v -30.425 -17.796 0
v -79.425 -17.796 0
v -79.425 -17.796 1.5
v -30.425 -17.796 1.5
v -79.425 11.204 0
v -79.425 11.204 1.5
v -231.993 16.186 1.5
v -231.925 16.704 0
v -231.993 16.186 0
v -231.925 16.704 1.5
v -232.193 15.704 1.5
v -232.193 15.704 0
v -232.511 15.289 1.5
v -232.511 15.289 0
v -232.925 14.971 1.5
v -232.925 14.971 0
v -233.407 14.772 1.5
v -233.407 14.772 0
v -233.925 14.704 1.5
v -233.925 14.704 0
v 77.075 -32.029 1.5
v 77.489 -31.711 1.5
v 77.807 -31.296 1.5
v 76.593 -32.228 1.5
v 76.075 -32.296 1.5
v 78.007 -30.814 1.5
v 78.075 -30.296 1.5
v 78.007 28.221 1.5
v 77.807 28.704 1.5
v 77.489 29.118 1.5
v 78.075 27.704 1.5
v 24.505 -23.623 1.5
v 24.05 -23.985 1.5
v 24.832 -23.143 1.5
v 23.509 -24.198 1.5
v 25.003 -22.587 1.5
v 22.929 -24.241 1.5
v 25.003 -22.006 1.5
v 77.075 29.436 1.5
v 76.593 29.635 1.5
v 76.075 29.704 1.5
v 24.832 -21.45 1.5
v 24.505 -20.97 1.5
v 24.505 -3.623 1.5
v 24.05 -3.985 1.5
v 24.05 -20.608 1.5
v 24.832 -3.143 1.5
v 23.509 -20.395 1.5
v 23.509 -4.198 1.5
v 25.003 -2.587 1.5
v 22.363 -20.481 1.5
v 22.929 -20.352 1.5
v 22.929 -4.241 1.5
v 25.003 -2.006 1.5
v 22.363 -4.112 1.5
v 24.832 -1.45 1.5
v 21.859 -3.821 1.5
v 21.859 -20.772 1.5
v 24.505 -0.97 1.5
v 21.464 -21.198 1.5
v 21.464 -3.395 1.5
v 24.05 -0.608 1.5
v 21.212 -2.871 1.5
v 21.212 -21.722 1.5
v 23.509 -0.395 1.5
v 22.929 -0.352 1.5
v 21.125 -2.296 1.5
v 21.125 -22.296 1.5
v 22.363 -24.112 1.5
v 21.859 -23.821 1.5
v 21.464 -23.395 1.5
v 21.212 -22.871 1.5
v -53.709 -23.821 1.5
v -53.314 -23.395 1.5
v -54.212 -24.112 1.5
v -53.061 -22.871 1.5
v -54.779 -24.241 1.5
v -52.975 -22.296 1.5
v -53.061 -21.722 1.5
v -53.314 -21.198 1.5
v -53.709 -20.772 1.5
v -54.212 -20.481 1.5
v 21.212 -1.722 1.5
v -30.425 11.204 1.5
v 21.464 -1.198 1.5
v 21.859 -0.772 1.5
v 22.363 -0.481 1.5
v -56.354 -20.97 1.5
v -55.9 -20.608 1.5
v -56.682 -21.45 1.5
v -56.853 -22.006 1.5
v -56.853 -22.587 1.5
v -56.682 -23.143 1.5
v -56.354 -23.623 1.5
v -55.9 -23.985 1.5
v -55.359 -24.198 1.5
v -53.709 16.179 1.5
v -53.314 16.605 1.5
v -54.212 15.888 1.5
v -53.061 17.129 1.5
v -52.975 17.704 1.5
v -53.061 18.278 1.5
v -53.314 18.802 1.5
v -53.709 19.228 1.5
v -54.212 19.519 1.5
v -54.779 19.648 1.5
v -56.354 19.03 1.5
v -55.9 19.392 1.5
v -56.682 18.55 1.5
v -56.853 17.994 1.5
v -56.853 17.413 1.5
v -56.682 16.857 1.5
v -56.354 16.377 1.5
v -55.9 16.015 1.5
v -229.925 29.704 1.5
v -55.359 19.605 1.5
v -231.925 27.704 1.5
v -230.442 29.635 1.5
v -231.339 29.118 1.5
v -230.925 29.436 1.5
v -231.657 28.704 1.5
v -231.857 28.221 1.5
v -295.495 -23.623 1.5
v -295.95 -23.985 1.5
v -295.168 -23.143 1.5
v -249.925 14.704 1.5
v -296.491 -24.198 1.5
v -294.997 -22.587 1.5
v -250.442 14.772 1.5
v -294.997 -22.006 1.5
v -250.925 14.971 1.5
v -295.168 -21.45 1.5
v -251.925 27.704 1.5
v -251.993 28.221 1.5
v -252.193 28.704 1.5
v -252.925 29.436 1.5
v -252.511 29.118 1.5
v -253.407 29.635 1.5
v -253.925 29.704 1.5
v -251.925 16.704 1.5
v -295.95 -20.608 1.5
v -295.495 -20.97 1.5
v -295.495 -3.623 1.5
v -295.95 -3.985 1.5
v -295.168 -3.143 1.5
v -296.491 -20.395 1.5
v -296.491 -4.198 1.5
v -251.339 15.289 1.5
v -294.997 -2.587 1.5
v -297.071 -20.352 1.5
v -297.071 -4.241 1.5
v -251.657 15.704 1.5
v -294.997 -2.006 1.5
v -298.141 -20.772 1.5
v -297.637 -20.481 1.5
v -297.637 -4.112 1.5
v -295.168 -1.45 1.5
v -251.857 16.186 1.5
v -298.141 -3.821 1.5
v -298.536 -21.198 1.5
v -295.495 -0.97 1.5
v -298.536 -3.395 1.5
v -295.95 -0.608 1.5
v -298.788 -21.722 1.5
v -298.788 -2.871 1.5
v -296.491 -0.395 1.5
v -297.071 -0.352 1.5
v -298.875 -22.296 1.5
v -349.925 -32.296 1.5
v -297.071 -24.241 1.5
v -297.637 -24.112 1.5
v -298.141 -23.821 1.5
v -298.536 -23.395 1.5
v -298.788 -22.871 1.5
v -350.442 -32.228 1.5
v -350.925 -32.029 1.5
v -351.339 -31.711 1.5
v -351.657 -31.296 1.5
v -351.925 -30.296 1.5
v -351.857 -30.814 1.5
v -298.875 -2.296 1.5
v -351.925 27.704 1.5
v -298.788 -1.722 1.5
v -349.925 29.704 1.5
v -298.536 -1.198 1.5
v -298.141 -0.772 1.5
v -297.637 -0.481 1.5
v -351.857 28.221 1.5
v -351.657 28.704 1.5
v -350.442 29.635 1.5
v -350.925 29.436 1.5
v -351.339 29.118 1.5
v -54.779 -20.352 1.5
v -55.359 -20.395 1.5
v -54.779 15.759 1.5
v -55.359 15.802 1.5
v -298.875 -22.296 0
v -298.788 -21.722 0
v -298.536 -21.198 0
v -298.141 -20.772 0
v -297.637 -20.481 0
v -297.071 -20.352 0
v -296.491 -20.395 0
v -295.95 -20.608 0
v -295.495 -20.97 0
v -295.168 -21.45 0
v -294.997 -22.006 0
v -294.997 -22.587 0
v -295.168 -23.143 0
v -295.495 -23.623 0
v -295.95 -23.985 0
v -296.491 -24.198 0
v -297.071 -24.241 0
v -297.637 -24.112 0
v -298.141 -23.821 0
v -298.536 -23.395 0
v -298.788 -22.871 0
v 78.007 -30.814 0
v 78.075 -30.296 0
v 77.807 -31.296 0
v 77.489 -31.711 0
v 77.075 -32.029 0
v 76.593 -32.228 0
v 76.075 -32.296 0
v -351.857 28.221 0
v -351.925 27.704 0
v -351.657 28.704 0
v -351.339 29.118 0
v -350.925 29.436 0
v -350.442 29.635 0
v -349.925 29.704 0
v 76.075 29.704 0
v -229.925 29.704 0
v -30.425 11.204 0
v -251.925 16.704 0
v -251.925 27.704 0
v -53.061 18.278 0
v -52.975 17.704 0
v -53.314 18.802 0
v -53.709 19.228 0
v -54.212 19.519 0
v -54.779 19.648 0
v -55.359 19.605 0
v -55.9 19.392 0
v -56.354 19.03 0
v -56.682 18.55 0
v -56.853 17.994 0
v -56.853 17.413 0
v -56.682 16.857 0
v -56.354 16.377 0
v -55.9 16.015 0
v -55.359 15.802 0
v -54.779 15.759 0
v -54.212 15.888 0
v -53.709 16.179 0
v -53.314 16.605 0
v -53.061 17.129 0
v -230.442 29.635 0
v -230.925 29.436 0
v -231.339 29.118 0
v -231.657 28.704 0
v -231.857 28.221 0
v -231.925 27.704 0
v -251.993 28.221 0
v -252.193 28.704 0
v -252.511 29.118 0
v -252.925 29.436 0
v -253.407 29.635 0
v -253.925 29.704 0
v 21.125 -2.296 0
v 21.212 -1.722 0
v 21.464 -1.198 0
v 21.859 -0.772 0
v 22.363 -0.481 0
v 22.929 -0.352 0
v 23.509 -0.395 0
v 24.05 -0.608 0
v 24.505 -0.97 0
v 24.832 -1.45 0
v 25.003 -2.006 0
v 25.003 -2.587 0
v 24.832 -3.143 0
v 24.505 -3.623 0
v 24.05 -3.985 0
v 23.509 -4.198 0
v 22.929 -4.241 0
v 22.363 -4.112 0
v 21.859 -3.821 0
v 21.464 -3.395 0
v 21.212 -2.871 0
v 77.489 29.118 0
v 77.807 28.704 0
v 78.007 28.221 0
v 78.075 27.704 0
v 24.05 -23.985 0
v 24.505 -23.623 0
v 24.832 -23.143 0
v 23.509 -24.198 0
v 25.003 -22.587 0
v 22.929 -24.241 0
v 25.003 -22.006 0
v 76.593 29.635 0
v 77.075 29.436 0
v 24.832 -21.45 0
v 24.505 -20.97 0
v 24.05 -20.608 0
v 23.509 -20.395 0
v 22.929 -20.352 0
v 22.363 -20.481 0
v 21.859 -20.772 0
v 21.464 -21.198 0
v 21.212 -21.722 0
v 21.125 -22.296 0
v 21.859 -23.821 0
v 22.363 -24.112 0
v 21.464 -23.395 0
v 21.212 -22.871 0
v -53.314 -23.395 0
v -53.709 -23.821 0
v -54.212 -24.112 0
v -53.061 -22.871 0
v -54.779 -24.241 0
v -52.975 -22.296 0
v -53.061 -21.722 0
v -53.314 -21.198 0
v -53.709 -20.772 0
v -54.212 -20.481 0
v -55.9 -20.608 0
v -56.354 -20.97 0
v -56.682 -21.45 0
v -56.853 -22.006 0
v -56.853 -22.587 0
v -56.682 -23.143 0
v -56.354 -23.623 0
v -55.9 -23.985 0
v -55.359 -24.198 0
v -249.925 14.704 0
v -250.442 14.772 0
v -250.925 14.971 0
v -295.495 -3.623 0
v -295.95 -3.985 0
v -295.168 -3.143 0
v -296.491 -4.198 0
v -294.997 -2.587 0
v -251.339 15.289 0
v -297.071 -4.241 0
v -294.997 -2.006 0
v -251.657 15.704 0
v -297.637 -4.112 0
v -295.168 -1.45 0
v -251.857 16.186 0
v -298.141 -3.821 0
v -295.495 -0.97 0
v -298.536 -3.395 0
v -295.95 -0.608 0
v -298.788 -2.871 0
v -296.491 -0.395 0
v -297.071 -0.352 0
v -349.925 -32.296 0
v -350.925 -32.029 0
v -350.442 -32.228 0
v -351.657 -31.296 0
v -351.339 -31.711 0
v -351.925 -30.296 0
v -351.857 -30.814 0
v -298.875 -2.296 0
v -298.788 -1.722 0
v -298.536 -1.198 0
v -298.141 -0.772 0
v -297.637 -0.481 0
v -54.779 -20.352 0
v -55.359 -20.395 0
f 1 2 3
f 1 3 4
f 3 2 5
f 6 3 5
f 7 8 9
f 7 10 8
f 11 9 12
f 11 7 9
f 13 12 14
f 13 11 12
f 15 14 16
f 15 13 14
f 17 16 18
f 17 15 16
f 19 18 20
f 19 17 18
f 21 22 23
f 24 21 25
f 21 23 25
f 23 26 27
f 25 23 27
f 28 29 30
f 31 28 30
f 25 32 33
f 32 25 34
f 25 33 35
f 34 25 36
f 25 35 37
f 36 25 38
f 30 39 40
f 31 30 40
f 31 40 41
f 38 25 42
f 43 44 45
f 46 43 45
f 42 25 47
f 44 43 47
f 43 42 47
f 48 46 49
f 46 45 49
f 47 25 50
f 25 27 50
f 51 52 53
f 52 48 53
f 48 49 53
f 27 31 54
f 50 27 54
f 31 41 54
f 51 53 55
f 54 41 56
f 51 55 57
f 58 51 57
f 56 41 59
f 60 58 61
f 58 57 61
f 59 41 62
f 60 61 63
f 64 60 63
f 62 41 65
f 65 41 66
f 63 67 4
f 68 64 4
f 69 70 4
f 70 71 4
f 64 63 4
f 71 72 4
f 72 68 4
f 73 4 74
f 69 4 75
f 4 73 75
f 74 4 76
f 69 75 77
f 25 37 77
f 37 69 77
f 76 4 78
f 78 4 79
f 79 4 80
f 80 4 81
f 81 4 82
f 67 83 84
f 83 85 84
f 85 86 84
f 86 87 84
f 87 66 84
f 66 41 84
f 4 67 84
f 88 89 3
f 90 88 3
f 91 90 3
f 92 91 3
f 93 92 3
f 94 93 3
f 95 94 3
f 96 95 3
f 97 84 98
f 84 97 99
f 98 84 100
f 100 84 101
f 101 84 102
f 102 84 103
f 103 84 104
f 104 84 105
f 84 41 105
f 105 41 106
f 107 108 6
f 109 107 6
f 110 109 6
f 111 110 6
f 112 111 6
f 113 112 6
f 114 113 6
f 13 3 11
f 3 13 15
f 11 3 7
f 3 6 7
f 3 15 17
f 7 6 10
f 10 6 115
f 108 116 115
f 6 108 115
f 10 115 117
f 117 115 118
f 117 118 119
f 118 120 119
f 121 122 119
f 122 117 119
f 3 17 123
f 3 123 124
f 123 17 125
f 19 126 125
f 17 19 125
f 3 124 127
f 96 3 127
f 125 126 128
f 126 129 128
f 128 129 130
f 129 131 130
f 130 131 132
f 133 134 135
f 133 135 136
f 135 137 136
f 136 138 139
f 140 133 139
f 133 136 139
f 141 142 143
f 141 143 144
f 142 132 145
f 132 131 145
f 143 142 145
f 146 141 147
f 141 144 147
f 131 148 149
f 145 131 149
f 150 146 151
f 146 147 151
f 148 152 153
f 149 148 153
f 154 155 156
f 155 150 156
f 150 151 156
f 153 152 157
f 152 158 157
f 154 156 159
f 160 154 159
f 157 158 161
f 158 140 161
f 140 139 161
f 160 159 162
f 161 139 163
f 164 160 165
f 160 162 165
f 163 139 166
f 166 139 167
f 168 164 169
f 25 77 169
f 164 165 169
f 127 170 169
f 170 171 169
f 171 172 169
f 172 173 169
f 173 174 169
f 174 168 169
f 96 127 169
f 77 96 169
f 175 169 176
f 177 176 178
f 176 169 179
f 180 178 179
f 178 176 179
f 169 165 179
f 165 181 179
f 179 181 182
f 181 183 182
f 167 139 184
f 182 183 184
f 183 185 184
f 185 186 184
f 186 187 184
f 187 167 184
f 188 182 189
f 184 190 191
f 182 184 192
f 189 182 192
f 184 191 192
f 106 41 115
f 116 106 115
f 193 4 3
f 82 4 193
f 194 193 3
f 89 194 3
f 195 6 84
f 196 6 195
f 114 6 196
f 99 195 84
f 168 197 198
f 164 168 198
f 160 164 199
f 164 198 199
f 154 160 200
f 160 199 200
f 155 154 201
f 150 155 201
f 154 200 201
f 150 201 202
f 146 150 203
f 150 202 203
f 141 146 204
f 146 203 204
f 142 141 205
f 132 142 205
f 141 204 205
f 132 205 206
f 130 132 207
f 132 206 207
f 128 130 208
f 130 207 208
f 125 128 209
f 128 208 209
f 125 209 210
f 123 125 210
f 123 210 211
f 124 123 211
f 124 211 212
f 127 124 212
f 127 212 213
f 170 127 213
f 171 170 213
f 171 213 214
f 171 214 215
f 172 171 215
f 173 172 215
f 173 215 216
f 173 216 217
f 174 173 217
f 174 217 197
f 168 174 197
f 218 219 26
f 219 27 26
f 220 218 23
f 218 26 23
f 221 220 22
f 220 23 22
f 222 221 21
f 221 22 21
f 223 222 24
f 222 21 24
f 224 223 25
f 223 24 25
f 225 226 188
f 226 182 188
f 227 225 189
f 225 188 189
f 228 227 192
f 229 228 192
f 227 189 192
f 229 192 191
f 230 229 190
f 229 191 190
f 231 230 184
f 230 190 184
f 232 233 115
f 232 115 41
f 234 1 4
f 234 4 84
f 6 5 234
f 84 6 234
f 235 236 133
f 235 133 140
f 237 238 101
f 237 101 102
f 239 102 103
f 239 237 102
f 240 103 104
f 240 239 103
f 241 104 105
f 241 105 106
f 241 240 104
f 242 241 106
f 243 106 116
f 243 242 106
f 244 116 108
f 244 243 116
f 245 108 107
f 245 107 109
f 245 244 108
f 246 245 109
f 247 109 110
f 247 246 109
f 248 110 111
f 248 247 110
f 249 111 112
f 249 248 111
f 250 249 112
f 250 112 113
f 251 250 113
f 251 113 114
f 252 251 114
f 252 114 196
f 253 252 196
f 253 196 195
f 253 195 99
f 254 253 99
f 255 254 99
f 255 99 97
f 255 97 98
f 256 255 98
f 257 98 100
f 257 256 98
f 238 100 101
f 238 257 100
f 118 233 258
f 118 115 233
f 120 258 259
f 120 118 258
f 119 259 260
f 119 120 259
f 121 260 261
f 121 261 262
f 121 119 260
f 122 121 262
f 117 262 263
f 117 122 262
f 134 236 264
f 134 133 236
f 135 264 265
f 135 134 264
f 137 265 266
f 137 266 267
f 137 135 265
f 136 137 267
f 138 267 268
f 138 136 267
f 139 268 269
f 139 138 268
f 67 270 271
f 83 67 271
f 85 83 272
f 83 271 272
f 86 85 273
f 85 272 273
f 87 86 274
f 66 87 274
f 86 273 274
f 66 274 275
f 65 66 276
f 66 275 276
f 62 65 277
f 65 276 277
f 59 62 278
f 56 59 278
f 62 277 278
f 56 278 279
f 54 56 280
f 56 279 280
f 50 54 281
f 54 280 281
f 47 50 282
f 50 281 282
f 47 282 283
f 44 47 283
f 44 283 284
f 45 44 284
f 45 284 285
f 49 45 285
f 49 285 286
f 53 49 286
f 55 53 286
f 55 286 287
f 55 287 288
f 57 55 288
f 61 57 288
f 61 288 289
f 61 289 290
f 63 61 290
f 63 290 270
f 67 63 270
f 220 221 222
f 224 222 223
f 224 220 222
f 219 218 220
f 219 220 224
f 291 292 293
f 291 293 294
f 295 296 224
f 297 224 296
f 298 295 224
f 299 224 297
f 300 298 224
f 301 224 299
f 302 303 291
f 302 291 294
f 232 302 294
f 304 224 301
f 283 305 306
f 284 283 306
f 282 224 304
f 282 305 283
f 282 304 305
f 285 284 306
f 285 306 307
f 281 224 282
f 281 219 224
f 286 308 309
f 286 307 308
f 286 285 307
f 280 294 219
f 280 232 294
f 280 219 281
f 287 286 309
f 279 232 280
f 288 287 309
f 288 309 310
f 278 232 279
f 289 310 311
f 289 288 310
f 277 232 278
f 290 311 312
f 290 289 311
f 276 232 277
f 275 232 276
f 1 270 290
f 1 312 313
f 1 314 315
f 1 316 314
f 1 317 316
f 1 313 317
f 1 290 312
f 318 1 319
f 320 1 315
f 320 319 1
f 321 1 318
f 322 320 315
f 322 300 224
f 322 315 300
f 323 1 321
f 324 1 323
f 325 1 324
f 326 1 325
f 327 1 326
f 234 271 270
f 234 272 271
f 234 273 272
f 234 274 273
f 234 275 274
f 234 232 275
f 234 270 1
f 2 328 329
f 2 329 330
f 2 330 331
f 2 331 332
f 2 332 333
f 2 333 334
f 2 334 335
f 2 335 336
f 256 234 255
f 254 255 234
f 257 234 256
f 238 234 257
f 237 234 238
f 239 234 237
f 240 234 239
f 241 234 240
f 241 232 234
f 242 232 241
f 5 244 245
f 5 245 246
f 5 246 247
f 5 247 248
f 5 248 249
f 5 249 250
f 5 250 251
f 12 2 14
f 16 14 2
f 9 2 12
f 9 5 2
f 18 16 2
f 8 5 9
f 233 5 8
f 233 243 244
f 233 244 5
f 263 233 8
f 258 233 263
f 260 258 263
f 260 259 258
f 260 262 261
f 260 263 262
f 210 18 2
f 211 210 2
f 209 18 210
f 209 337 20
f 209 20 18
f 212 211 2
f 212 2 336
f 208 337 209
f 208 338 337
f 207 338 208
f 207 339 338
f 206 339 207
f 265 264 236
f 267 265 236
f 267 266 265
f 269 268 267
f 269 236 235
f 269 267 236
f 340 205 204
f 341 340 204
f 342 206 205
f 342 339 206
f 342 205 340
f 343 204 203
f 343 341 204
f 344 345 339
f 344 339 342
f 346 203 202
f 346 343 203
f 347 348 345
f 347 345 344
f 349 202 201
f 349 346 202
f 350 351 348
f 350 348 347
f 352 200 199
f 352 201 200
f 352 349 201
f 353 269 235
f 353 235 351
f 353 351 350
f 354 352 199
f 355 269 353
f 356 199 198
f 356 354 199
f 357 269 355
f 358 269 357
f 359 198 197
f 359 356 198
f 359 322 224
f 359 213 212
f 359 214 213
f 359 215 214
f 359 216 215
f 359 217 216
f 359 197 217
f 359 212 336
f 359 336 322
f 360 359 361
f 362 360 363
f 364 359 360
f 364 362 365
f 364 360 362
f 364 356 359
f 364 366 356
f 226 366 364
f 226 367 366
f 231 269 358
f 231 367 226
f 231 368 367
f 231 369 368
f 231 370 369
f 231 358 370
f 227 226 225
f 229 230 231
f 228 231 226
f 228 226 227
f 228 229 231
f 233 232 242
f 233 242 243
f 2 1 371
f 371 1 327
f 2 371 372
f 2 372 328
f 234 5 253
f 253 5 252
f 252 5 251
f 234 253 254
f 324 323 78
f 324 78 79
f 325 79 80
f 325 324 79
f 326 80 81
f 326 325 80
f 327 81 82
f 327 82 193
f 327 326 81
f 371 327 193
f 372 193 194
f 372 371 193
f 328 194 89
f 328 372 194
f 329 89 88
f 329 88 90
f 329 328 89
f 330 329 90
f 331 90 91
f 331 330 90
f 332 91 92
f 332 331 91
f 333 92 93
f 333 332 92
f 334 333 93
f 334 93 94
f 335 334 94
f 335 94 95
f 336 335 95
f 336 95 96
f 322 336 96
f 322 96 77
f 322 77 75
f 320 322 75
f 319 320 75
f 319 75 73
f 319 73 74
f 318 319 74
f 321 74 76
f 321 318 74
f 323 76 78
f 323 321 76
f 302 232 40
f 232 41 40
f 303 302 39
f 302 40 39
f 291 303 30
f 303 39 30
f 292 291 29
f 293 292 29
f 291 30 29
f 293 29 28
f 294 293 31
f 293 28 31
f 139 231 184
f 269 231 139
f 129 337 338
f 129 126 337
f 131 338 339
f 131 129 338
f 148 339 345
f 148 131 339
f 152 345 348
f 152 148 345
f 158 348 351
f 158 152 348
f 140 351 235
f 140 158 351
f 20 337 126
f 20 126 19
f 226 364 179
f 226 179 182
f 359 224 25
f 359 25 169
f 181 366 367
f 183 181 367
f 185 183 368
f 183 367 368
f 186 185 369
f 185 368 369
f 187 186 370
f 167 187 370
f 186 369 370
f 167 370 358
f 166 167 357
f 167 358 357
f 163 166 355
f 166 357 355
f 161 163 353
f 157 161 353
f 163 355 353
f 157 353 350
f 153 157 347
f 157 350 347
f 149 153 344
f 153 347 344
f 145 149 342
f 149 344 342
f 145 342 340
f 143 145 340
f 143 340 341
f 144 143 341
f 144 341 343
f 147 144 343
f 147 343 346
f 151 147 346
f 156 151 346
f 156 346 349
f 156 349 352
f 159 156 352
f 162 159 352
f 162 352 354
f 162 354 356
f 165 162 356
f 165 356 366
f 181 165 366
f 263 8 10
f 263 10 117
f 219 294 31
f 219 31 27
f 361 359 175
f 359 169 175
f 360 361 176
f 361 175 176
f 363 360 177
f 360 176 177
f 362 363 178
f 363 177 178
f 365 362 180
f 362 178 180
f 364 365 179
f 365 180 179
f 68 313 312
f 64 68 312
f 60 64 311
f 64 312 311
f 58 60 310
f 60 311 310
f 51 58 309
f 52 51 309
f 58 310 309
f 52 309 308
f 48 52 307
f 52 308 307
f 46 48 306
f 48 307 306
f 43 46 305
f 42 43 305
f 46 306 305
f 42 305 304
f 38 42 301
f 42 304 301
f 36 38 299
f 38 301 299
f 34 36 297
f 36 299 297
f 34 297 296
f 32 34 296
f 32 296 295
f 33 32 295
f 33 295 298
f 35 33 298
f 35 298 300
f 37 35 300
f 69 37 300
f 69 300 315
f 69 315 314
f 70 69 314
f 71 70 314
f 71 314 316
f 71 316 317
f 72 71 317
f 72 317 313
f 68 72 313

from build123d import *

# Parameters (mm, degrees)
SKETCH1_R           = 1.95
SKETCH1_W           = 49
SKETCH1_H           = 29
BOSS_EXTRUDE1_DEPTH = 1.5
FILLET1_R           = 2
SKETCH3_R           = 1.95
CUT_EXTRUDE1_DEPTH  = 10


with BuildPart() as part:
    # Sketch1 → Boss-Extrude1 (new body)
    with BuildSketch(Plane.XY):
        Polygon((-231.924811832, 29.703517588), (78.075188168, 29.703517588), (78.075188168, -32.296482412), (-351.924811832, -32.296482412), (-351.924811832, 29.703517588), (-251.924811832, 29.703517588), (-251.924811832, 14.703517588), (-231.924811832, 14.703517588), align=None)
        with Locations((-54.924811832, 17.703517588)):
            Circle(SKETCH1_R, mode=Mode.SUBTRACT)
        with Locations((-54.924811832, -22.296482412)):
            Circle(SKETCH1_R, mode=Mode.SUBTRACT)
        with Locations((-54.924811832, -3.296482412)):
            Rectangle(SKETCH1_W, SKETCH1_H, mode=Mode.SUBTRACT)
    extrude(amount=BOSS_EXTRUDE1_DEPTH)

    # Fillet1
    fillet1_edges = [part.edges().sort_by_distance(p)[0] for p in [
        (-351.924811832, 29.703517588, 0.75),
        (-251.924811832, 29.703517588, 0.75),
        (-251.924811832, 14.703517588, 0.75),
        (-231.924811832, 14.703517588, 0.75),
        (-231.924811832, 29.703517588, 0.75),
        (78.075188168, 29.703517588, 0.75),
        (78.075188168, -32.296482412, 0.75),
        (-351.924811832, -32.296482412, 0.75),
    ]]
    fillet(fillet1_edges, radius=FILLET1_R)

    # Sketch3 → Cut-Extrude1 (cut)
    with BuildSketch(Plane(origin=(0, 0, 0), x_dir=(-1, 0, 0), z_dir=(0, 0, -1))):
        with Locations((-23.075188168, -22.296482412)):
            Circle(SKETCH3_R)
        with Locations((-23.075188168, -2.296482412)):
            Circle(SKETCH3_R)
        with Locations((296.924811832, -22.296482412)):
            Circle(SKETCH3_R)
        with Locations((296.924811832, -2.296482412)):
            Circle(SKETCH3_R)
    extrude(amount=-CUT_EXTRUDE1_DEPTH, mode=Mode.SUBTRACT)


solid = part.part
